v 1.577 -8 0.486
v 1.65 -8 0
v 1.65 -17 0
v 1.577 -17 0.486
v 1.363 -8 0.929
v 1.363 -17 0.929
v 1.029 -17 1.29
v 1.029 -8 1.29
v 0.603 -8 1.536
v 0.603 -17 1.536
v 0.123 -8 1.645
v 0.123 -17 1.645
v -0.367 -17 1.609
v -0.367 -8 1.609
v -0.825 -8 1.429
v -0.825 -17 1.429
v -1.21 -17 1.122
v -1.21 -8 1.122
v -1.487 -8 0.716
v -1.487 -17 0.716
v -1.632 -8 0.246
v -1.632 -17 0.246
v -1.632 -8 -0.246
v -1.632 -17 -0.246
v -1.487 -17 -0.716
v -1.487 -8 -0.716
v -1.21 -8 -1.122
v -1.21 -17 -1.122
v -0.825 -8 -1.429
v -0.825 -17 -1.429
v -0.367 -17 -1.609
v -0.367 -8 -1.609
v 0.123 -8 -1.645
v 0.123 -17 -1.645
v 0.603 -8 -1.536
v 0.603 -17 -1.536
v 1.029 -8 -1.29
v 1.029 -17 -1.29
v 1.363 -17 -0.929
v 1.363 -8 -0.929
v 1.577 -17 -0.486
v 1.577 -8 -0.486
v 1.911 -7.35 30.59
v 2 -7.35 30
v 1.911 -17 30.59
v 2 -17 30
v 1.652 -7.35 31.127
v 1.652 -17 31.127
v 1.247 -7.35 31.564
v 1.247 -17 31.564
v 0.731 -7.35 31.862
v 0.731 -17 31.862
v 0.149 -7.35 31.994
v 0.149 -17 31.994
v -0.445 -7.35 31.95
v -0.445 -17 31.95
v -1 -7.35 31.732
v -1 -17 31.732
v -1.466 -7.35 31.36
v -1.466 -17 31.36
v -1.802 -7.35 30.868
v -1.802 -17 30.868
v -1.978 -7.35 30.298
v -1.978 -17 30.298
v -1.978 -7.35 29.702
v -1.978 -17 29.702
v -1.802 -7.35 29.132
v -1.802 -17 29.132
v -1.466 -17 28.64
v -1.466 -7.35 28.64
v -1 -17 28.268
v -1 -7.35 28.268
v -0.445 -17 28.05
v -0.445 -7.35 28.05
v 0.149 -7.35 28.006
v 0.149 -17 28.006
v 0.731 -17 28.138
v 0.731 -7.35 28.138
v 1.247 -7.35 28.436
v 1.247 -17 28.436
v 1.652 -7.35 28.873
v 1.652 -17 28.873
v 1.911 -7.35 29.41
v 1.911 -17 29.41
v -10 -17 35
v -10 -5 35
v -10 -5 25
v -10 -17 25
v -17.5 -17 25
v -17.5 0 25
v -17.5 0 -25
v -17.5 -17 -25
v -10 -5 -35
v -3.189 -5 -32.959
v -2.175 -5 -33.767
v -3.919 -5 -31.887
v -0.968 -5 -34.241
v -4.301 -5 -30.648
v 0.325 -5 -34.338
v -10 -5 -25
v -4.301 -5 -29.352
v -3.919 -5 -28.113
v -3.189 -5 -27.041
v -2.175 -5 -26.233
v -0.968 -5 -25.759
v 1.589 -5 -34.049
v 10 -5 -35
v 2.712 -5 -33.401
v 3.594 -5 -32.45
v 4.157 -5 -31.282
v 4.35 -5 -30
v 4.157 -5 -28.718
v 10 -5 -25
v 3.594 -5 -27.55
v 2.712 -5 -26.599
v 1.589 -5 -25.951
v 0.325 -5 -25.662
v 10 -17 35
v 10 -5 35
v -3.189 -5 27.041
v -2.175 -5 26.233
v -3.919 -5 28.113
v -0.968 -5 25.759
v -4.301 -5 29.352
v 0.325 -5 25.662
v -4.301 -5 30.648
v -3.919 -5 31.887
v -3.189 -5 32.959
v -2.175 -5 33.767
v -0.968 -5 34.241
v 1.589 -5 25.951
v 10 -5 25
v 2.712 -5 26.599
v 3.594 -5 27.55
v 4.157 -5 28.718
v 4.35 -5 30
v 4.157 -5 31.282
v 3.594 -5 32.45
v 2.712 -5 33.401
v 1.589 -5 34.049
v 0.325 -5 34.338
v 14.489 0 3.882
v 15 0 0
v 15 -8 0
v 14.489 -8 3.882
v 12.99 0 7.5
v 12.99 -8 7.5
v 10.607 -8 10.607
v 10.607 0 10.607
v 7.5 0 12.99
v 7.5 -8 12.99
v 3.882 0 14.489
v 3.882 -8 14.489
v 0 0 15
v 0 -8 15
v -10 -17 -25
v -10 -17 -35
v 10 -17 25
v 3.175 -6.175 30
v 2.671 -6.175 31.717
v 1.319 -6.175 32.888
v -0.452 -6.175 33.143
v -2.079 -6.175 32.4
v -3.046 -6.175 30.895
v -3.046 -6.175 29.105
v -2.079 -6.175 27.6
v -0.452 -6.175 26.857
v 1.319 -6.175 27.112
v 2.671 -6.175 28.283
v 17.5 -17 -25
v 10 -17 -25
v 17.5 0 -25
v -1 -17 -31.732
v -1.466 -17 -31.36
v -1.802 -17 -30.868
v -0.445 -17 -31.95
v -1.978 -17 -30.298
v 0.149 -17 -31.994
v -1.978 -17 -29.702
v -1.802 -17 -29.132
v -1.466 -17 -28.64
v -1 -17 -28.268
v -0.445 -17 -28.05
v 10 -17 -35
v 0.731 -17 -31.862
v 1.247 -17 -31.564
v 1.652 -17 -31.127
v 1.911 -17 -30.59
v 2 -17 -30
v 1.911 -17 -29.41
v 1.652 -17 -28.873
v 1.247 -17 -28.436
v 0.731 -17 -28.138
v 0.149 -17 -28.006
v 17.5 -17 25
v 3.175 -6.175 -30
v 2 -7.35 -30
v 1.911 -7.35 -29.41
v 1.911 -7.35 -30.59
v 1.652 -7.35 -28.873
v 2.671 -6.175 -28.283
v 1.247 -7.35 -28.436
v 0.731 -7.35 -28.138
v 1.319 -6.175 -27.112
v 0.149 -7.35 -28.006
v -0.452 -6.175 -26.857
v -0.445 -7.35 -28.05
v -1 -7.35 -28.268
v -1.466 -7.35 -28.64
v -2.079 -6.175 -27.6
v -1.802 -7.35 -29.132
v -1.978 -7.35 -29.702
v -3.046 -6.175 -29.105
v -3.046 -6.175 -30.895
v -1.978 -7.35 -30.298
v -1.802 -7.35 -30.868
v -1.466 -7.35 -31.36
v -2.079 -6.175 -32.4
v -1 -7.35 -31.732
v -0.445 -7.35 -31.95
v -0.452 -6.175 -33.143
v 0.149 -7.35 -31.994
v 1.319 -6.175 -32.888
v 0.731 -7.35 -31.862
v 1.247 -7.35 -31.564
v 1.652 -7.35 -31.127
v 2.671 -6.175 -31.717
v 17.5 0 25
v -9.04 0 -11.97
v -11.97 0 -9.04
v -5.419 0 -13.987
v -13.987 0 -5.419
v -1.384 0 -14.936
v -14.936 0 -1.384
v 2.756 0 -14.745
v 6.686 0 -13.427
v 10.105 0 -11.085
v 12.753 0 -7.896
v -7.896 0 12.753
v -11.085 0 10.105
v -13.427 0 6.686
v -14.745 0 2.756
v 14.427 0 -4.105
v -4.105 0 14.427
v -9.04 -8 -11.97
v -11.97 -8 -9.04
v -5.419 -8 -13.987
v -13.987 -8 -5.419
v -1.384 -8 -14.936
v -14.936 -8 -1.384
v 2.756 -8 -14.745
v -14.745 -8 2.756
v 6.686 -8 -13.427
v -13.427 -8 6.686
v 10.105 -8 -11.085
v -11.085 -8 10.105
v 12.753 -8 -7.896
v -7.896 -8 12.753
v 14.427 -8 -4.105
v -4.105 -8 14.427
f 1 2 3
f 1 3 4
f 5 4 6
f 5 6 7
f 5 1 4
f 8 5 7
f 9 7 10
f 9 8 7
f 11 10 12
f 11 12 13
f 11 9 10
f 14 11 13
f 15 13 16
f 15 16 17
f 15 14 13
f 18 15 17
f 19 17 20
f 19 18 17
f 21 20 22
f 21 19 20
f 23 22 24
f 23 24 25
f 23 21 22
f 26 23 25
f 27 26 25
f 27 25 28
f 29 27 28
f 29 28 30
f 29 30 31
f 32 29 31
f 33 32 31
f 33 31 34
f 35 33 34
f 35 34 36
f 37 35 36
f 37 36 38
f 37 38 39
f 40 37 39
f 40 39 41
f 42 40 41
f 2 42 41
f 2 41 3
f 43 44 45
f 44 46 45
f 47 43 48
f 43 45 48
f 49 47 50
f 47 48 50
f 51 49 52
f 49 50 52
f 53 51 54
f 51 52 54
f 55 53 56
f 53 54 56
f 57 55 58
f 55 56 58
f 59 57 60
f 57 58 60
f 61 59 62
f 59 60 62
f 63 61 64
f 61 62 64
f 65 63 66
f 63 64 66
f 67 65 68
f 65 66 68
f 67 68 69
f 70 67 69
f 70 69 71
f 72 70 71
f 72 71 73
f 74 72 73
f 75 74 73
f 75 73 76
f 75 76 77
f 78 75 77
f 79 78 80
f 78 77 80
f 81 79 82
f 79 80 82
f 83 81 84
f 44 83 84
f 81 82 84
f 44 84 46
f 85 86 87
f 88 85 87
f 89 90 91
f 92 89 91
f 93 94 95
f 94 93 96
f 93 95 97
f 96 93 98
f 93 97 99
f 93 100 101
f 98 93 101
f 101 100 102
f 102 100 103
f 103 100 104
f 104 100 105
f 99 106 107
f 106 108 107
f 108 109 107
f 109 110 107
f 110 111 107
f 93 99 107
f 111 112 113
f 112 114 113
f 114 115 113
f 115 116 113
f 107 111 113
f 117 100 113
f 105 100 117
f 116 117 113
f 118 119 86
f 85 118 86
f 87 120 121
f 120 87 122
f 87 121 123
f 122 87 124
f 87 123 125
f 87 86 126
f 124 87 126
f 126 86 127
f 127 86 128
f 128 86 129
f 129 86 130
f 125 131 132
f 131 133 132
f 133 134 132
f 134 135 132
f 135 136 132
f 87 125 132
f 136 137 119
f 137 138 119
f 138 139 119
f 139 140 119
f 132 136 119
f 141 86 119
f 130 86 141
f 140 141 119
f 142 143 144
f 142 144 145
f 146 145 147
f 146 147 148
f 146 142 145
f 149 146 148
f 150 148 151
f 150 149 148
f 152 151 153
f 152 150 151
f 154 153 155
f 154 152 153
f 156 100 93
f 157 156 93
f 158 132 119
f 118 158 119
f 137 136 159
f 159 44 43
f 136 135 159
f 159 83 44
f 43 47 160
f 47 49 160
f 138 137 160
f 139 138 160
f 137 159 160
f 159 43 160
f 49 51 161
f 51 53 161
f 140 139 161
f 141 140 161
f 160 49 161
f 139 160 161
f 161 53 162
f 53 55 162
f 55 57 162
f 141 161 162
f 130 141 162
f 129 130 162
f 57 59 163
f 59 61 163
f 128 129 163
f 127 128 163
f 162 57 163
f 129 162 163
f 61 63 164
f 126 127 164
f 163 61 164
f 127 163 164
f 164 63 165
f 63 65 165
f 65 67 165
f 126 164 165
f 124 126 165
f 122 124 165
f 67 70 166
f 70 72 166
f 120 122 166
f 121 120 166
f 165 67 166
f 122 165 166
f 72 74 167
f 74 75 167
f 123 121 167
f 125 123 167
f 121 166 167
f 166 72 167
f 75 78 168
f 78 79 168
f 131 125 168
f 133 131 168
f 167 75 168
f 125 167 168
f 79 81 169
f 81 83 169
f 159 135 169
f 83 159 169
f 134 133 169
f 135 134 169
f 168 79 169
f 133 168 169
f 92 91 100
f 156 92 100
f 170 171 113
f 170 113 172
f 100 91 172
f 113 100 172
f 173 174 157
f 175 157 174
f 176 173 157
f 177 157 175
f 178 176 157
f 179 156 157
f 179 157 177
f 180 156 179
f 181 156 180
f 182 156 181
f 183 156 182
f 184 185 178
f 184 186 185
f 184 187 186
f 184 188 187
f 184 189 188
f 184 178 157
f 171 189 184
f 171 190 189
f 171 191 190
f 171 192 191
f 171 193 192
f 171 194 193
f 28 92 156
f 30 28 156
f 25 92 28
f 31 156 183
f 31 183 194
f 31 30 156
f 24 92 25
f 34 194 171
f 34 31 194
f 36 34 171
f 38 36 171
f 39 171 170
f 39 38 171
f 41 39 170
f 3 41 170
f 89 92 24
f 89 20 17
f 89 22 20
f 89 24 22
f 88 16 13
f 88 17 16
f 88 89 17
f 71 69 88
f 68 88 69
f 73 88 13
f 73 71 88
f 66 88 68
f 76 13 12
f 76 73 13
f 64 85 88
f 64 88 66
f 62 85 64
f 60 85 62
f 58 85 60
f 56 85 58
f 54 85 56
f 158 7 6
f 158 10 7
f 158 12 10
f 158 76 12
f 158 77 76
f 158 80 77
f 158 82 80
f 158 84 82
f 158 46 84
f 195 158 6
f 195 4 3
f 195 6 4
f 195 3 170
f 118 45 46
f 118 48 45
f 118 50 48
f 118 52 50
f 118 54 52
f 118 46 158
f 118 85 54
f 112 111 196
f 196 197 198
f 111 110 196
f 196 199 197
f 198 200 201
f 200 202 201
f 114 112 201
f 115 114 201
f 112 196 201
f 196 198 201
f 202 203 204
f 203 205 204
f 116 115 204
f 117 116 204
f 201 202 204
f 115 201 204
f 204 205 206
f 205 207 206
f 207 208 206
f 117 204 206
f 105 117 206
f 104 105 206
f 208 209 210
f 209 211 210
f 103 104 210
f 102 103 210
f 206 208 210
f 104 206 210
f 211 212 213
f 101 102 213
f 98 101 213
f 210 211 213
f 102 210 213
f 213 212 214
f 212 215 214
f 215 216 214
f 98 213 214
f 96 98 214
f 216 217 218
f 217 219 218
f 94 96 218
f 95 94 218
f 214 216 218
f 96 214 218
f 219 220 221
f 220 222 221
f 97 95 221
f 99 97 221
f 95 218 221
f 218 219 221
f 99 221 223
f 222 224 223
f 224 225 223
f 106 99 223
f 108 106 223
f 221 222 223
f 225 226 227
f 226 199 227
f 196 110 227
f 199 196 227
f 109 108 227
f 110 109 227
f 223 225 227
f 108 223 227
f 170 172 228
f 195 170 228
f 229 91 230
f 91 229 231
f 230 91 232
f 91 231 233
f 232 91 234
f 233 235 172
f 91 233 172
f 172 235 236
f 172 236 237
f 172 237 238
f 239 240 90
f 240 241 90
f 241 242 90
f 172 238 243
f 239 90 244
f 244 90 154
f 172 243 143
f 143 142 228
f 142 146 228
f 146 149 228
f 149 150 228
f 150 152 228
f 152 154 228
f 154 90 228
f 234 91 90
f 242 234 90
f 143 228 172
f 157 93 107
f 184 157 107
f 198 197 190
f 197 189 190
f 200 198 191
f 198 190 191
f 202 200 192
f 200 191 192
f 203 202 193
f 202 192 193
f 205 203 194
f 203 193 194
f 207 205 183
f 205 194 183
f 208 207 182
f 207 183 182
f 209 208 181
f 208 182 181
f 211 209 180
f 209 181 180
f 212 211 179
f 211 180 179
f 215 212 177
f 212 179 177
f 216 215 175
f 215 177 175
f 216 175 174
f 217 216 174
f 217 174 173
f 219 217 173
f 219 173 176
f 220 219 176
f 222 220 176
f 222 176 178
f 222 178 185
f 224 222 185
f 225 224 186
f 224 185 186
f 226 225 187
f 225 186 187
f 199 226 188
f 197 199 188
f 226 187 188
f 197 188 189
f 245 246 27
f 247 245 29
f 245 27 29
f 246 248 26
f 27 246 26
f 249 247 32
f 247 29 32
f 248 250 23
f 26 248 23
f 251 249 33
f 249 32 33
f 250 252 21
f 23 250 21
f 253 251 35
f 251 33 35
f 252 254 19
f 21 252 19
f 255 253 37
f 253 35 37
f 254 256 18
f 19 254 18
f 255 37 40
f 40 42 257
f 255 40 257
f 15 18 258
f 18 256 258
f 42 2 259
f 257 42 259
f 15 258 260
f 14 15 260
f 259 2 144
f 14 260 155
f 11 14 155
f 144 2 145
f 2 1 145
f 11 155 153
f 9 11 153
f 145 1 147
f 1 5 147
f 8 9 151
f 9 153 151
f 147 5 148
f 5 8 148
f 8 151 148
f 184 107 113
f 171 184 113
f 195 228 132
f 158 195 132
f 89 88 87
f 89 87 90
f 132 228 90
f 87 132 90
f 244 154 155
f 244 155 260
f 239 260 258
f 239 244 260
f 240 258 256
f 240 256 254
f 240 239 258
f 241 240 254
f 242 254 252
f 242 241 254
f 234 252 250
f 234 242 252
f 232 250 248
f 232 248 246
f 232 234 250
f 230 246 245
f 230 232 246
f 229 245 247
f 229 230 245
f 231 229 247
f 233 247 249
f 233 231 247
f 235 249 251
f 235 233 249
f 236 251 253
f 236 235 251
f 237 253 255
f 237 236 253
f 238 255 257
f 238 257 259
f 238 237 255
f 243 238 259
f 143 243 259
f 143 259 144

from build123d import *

# Parameters (mm, degrees)
F0_R           = 1.65
F1_DEPTH       = 17
F2_DEPTH       = 8
F3_DEPTH       = 5
F6_D           = 4
F6_CSINK_D     = 8.7
F6_CSINK_ANGLE = 90


with BuildPart() as f1:
    # F0 (on Front) → F1 (new body)
    with BuildSketch(Plane.XZ):
        Polygon((10, 25), (0, 25), (-10, 25), (-17.5, 25), (-17.5, 0), (-17.5, -25), (-10, -25), (0, -25), (10, -25), (17.5, -25), (17.5, 25), align=None)
        with BuildLine():
            ThreePointArc((0, 15), (10.606602, 10.606602), (15, 0))
            ThreePointArc((15, 0), (-10.606602, -10.606602), (0, 15))
        make_face(mode=Mode.SUBTRACT)
        with BuildLine():
            ThreePointArc((0, 15), (-10.606602, -10.606602), (15, 0))
            ThreePointArc((15, 0), (10.606602, 10.606602), (0, 15))
        make_face()
        Circle(F0_R, mode=Mode.SUBTRACT)
        Polygon((-10, 25), (0, 25), (10, 25), (10, 35), (0, 35), (-10, 35), align=None)
        Polygon((10, -35), (10, -25), (0, -25), (-10, -25), (-10, -35), (0, -35), align=None)
    extrude(amount=F1_DEPTH)

    # F0 (on Front) → F2 (cut)
    with BuildSketch(Plane.XZ):
        with BuildLine():
            ThreePointArc((0, 15), (-10.606602, -10.606602), (15, 0))
            ThreePointArc((15, 0), (10.606602, 10.606602), (0, 15))
        make_face()
        Circle(F0_R, mode=Mode.SUBTRACT)
    extrude(amount=F2_DEPTH, mode=Mode.SUBTRACT)

    # F0 (on Front) → F3 (cut)
    with BuildSketch(Plane.XZ):
        Polygon((-10, 25), (0, 25), (10, 25), (10, 35), (0, 35), (-10, 35), align=None)
        Polygon((10, -35), (10, -25), (0, -25), (-10, -25), (-10, -35), (0, -35), align=None)
    extrude(amount=F3_DEPTH, mode=Mode.SUBTRACT)

    # F6 (through all)
    with Locations(Plane(origin=(0, -5, 0), x_dir=(-1, 0, 0), z_dir=(0, 1, 0))):
        with Locations((0, -30), (0, 30)):
            CounterSinkHole(F6_D / 2, F6_CSINK_D / 2, counter_sink_angle=F6_CSINK_ANGLE)


solid = f1.part
